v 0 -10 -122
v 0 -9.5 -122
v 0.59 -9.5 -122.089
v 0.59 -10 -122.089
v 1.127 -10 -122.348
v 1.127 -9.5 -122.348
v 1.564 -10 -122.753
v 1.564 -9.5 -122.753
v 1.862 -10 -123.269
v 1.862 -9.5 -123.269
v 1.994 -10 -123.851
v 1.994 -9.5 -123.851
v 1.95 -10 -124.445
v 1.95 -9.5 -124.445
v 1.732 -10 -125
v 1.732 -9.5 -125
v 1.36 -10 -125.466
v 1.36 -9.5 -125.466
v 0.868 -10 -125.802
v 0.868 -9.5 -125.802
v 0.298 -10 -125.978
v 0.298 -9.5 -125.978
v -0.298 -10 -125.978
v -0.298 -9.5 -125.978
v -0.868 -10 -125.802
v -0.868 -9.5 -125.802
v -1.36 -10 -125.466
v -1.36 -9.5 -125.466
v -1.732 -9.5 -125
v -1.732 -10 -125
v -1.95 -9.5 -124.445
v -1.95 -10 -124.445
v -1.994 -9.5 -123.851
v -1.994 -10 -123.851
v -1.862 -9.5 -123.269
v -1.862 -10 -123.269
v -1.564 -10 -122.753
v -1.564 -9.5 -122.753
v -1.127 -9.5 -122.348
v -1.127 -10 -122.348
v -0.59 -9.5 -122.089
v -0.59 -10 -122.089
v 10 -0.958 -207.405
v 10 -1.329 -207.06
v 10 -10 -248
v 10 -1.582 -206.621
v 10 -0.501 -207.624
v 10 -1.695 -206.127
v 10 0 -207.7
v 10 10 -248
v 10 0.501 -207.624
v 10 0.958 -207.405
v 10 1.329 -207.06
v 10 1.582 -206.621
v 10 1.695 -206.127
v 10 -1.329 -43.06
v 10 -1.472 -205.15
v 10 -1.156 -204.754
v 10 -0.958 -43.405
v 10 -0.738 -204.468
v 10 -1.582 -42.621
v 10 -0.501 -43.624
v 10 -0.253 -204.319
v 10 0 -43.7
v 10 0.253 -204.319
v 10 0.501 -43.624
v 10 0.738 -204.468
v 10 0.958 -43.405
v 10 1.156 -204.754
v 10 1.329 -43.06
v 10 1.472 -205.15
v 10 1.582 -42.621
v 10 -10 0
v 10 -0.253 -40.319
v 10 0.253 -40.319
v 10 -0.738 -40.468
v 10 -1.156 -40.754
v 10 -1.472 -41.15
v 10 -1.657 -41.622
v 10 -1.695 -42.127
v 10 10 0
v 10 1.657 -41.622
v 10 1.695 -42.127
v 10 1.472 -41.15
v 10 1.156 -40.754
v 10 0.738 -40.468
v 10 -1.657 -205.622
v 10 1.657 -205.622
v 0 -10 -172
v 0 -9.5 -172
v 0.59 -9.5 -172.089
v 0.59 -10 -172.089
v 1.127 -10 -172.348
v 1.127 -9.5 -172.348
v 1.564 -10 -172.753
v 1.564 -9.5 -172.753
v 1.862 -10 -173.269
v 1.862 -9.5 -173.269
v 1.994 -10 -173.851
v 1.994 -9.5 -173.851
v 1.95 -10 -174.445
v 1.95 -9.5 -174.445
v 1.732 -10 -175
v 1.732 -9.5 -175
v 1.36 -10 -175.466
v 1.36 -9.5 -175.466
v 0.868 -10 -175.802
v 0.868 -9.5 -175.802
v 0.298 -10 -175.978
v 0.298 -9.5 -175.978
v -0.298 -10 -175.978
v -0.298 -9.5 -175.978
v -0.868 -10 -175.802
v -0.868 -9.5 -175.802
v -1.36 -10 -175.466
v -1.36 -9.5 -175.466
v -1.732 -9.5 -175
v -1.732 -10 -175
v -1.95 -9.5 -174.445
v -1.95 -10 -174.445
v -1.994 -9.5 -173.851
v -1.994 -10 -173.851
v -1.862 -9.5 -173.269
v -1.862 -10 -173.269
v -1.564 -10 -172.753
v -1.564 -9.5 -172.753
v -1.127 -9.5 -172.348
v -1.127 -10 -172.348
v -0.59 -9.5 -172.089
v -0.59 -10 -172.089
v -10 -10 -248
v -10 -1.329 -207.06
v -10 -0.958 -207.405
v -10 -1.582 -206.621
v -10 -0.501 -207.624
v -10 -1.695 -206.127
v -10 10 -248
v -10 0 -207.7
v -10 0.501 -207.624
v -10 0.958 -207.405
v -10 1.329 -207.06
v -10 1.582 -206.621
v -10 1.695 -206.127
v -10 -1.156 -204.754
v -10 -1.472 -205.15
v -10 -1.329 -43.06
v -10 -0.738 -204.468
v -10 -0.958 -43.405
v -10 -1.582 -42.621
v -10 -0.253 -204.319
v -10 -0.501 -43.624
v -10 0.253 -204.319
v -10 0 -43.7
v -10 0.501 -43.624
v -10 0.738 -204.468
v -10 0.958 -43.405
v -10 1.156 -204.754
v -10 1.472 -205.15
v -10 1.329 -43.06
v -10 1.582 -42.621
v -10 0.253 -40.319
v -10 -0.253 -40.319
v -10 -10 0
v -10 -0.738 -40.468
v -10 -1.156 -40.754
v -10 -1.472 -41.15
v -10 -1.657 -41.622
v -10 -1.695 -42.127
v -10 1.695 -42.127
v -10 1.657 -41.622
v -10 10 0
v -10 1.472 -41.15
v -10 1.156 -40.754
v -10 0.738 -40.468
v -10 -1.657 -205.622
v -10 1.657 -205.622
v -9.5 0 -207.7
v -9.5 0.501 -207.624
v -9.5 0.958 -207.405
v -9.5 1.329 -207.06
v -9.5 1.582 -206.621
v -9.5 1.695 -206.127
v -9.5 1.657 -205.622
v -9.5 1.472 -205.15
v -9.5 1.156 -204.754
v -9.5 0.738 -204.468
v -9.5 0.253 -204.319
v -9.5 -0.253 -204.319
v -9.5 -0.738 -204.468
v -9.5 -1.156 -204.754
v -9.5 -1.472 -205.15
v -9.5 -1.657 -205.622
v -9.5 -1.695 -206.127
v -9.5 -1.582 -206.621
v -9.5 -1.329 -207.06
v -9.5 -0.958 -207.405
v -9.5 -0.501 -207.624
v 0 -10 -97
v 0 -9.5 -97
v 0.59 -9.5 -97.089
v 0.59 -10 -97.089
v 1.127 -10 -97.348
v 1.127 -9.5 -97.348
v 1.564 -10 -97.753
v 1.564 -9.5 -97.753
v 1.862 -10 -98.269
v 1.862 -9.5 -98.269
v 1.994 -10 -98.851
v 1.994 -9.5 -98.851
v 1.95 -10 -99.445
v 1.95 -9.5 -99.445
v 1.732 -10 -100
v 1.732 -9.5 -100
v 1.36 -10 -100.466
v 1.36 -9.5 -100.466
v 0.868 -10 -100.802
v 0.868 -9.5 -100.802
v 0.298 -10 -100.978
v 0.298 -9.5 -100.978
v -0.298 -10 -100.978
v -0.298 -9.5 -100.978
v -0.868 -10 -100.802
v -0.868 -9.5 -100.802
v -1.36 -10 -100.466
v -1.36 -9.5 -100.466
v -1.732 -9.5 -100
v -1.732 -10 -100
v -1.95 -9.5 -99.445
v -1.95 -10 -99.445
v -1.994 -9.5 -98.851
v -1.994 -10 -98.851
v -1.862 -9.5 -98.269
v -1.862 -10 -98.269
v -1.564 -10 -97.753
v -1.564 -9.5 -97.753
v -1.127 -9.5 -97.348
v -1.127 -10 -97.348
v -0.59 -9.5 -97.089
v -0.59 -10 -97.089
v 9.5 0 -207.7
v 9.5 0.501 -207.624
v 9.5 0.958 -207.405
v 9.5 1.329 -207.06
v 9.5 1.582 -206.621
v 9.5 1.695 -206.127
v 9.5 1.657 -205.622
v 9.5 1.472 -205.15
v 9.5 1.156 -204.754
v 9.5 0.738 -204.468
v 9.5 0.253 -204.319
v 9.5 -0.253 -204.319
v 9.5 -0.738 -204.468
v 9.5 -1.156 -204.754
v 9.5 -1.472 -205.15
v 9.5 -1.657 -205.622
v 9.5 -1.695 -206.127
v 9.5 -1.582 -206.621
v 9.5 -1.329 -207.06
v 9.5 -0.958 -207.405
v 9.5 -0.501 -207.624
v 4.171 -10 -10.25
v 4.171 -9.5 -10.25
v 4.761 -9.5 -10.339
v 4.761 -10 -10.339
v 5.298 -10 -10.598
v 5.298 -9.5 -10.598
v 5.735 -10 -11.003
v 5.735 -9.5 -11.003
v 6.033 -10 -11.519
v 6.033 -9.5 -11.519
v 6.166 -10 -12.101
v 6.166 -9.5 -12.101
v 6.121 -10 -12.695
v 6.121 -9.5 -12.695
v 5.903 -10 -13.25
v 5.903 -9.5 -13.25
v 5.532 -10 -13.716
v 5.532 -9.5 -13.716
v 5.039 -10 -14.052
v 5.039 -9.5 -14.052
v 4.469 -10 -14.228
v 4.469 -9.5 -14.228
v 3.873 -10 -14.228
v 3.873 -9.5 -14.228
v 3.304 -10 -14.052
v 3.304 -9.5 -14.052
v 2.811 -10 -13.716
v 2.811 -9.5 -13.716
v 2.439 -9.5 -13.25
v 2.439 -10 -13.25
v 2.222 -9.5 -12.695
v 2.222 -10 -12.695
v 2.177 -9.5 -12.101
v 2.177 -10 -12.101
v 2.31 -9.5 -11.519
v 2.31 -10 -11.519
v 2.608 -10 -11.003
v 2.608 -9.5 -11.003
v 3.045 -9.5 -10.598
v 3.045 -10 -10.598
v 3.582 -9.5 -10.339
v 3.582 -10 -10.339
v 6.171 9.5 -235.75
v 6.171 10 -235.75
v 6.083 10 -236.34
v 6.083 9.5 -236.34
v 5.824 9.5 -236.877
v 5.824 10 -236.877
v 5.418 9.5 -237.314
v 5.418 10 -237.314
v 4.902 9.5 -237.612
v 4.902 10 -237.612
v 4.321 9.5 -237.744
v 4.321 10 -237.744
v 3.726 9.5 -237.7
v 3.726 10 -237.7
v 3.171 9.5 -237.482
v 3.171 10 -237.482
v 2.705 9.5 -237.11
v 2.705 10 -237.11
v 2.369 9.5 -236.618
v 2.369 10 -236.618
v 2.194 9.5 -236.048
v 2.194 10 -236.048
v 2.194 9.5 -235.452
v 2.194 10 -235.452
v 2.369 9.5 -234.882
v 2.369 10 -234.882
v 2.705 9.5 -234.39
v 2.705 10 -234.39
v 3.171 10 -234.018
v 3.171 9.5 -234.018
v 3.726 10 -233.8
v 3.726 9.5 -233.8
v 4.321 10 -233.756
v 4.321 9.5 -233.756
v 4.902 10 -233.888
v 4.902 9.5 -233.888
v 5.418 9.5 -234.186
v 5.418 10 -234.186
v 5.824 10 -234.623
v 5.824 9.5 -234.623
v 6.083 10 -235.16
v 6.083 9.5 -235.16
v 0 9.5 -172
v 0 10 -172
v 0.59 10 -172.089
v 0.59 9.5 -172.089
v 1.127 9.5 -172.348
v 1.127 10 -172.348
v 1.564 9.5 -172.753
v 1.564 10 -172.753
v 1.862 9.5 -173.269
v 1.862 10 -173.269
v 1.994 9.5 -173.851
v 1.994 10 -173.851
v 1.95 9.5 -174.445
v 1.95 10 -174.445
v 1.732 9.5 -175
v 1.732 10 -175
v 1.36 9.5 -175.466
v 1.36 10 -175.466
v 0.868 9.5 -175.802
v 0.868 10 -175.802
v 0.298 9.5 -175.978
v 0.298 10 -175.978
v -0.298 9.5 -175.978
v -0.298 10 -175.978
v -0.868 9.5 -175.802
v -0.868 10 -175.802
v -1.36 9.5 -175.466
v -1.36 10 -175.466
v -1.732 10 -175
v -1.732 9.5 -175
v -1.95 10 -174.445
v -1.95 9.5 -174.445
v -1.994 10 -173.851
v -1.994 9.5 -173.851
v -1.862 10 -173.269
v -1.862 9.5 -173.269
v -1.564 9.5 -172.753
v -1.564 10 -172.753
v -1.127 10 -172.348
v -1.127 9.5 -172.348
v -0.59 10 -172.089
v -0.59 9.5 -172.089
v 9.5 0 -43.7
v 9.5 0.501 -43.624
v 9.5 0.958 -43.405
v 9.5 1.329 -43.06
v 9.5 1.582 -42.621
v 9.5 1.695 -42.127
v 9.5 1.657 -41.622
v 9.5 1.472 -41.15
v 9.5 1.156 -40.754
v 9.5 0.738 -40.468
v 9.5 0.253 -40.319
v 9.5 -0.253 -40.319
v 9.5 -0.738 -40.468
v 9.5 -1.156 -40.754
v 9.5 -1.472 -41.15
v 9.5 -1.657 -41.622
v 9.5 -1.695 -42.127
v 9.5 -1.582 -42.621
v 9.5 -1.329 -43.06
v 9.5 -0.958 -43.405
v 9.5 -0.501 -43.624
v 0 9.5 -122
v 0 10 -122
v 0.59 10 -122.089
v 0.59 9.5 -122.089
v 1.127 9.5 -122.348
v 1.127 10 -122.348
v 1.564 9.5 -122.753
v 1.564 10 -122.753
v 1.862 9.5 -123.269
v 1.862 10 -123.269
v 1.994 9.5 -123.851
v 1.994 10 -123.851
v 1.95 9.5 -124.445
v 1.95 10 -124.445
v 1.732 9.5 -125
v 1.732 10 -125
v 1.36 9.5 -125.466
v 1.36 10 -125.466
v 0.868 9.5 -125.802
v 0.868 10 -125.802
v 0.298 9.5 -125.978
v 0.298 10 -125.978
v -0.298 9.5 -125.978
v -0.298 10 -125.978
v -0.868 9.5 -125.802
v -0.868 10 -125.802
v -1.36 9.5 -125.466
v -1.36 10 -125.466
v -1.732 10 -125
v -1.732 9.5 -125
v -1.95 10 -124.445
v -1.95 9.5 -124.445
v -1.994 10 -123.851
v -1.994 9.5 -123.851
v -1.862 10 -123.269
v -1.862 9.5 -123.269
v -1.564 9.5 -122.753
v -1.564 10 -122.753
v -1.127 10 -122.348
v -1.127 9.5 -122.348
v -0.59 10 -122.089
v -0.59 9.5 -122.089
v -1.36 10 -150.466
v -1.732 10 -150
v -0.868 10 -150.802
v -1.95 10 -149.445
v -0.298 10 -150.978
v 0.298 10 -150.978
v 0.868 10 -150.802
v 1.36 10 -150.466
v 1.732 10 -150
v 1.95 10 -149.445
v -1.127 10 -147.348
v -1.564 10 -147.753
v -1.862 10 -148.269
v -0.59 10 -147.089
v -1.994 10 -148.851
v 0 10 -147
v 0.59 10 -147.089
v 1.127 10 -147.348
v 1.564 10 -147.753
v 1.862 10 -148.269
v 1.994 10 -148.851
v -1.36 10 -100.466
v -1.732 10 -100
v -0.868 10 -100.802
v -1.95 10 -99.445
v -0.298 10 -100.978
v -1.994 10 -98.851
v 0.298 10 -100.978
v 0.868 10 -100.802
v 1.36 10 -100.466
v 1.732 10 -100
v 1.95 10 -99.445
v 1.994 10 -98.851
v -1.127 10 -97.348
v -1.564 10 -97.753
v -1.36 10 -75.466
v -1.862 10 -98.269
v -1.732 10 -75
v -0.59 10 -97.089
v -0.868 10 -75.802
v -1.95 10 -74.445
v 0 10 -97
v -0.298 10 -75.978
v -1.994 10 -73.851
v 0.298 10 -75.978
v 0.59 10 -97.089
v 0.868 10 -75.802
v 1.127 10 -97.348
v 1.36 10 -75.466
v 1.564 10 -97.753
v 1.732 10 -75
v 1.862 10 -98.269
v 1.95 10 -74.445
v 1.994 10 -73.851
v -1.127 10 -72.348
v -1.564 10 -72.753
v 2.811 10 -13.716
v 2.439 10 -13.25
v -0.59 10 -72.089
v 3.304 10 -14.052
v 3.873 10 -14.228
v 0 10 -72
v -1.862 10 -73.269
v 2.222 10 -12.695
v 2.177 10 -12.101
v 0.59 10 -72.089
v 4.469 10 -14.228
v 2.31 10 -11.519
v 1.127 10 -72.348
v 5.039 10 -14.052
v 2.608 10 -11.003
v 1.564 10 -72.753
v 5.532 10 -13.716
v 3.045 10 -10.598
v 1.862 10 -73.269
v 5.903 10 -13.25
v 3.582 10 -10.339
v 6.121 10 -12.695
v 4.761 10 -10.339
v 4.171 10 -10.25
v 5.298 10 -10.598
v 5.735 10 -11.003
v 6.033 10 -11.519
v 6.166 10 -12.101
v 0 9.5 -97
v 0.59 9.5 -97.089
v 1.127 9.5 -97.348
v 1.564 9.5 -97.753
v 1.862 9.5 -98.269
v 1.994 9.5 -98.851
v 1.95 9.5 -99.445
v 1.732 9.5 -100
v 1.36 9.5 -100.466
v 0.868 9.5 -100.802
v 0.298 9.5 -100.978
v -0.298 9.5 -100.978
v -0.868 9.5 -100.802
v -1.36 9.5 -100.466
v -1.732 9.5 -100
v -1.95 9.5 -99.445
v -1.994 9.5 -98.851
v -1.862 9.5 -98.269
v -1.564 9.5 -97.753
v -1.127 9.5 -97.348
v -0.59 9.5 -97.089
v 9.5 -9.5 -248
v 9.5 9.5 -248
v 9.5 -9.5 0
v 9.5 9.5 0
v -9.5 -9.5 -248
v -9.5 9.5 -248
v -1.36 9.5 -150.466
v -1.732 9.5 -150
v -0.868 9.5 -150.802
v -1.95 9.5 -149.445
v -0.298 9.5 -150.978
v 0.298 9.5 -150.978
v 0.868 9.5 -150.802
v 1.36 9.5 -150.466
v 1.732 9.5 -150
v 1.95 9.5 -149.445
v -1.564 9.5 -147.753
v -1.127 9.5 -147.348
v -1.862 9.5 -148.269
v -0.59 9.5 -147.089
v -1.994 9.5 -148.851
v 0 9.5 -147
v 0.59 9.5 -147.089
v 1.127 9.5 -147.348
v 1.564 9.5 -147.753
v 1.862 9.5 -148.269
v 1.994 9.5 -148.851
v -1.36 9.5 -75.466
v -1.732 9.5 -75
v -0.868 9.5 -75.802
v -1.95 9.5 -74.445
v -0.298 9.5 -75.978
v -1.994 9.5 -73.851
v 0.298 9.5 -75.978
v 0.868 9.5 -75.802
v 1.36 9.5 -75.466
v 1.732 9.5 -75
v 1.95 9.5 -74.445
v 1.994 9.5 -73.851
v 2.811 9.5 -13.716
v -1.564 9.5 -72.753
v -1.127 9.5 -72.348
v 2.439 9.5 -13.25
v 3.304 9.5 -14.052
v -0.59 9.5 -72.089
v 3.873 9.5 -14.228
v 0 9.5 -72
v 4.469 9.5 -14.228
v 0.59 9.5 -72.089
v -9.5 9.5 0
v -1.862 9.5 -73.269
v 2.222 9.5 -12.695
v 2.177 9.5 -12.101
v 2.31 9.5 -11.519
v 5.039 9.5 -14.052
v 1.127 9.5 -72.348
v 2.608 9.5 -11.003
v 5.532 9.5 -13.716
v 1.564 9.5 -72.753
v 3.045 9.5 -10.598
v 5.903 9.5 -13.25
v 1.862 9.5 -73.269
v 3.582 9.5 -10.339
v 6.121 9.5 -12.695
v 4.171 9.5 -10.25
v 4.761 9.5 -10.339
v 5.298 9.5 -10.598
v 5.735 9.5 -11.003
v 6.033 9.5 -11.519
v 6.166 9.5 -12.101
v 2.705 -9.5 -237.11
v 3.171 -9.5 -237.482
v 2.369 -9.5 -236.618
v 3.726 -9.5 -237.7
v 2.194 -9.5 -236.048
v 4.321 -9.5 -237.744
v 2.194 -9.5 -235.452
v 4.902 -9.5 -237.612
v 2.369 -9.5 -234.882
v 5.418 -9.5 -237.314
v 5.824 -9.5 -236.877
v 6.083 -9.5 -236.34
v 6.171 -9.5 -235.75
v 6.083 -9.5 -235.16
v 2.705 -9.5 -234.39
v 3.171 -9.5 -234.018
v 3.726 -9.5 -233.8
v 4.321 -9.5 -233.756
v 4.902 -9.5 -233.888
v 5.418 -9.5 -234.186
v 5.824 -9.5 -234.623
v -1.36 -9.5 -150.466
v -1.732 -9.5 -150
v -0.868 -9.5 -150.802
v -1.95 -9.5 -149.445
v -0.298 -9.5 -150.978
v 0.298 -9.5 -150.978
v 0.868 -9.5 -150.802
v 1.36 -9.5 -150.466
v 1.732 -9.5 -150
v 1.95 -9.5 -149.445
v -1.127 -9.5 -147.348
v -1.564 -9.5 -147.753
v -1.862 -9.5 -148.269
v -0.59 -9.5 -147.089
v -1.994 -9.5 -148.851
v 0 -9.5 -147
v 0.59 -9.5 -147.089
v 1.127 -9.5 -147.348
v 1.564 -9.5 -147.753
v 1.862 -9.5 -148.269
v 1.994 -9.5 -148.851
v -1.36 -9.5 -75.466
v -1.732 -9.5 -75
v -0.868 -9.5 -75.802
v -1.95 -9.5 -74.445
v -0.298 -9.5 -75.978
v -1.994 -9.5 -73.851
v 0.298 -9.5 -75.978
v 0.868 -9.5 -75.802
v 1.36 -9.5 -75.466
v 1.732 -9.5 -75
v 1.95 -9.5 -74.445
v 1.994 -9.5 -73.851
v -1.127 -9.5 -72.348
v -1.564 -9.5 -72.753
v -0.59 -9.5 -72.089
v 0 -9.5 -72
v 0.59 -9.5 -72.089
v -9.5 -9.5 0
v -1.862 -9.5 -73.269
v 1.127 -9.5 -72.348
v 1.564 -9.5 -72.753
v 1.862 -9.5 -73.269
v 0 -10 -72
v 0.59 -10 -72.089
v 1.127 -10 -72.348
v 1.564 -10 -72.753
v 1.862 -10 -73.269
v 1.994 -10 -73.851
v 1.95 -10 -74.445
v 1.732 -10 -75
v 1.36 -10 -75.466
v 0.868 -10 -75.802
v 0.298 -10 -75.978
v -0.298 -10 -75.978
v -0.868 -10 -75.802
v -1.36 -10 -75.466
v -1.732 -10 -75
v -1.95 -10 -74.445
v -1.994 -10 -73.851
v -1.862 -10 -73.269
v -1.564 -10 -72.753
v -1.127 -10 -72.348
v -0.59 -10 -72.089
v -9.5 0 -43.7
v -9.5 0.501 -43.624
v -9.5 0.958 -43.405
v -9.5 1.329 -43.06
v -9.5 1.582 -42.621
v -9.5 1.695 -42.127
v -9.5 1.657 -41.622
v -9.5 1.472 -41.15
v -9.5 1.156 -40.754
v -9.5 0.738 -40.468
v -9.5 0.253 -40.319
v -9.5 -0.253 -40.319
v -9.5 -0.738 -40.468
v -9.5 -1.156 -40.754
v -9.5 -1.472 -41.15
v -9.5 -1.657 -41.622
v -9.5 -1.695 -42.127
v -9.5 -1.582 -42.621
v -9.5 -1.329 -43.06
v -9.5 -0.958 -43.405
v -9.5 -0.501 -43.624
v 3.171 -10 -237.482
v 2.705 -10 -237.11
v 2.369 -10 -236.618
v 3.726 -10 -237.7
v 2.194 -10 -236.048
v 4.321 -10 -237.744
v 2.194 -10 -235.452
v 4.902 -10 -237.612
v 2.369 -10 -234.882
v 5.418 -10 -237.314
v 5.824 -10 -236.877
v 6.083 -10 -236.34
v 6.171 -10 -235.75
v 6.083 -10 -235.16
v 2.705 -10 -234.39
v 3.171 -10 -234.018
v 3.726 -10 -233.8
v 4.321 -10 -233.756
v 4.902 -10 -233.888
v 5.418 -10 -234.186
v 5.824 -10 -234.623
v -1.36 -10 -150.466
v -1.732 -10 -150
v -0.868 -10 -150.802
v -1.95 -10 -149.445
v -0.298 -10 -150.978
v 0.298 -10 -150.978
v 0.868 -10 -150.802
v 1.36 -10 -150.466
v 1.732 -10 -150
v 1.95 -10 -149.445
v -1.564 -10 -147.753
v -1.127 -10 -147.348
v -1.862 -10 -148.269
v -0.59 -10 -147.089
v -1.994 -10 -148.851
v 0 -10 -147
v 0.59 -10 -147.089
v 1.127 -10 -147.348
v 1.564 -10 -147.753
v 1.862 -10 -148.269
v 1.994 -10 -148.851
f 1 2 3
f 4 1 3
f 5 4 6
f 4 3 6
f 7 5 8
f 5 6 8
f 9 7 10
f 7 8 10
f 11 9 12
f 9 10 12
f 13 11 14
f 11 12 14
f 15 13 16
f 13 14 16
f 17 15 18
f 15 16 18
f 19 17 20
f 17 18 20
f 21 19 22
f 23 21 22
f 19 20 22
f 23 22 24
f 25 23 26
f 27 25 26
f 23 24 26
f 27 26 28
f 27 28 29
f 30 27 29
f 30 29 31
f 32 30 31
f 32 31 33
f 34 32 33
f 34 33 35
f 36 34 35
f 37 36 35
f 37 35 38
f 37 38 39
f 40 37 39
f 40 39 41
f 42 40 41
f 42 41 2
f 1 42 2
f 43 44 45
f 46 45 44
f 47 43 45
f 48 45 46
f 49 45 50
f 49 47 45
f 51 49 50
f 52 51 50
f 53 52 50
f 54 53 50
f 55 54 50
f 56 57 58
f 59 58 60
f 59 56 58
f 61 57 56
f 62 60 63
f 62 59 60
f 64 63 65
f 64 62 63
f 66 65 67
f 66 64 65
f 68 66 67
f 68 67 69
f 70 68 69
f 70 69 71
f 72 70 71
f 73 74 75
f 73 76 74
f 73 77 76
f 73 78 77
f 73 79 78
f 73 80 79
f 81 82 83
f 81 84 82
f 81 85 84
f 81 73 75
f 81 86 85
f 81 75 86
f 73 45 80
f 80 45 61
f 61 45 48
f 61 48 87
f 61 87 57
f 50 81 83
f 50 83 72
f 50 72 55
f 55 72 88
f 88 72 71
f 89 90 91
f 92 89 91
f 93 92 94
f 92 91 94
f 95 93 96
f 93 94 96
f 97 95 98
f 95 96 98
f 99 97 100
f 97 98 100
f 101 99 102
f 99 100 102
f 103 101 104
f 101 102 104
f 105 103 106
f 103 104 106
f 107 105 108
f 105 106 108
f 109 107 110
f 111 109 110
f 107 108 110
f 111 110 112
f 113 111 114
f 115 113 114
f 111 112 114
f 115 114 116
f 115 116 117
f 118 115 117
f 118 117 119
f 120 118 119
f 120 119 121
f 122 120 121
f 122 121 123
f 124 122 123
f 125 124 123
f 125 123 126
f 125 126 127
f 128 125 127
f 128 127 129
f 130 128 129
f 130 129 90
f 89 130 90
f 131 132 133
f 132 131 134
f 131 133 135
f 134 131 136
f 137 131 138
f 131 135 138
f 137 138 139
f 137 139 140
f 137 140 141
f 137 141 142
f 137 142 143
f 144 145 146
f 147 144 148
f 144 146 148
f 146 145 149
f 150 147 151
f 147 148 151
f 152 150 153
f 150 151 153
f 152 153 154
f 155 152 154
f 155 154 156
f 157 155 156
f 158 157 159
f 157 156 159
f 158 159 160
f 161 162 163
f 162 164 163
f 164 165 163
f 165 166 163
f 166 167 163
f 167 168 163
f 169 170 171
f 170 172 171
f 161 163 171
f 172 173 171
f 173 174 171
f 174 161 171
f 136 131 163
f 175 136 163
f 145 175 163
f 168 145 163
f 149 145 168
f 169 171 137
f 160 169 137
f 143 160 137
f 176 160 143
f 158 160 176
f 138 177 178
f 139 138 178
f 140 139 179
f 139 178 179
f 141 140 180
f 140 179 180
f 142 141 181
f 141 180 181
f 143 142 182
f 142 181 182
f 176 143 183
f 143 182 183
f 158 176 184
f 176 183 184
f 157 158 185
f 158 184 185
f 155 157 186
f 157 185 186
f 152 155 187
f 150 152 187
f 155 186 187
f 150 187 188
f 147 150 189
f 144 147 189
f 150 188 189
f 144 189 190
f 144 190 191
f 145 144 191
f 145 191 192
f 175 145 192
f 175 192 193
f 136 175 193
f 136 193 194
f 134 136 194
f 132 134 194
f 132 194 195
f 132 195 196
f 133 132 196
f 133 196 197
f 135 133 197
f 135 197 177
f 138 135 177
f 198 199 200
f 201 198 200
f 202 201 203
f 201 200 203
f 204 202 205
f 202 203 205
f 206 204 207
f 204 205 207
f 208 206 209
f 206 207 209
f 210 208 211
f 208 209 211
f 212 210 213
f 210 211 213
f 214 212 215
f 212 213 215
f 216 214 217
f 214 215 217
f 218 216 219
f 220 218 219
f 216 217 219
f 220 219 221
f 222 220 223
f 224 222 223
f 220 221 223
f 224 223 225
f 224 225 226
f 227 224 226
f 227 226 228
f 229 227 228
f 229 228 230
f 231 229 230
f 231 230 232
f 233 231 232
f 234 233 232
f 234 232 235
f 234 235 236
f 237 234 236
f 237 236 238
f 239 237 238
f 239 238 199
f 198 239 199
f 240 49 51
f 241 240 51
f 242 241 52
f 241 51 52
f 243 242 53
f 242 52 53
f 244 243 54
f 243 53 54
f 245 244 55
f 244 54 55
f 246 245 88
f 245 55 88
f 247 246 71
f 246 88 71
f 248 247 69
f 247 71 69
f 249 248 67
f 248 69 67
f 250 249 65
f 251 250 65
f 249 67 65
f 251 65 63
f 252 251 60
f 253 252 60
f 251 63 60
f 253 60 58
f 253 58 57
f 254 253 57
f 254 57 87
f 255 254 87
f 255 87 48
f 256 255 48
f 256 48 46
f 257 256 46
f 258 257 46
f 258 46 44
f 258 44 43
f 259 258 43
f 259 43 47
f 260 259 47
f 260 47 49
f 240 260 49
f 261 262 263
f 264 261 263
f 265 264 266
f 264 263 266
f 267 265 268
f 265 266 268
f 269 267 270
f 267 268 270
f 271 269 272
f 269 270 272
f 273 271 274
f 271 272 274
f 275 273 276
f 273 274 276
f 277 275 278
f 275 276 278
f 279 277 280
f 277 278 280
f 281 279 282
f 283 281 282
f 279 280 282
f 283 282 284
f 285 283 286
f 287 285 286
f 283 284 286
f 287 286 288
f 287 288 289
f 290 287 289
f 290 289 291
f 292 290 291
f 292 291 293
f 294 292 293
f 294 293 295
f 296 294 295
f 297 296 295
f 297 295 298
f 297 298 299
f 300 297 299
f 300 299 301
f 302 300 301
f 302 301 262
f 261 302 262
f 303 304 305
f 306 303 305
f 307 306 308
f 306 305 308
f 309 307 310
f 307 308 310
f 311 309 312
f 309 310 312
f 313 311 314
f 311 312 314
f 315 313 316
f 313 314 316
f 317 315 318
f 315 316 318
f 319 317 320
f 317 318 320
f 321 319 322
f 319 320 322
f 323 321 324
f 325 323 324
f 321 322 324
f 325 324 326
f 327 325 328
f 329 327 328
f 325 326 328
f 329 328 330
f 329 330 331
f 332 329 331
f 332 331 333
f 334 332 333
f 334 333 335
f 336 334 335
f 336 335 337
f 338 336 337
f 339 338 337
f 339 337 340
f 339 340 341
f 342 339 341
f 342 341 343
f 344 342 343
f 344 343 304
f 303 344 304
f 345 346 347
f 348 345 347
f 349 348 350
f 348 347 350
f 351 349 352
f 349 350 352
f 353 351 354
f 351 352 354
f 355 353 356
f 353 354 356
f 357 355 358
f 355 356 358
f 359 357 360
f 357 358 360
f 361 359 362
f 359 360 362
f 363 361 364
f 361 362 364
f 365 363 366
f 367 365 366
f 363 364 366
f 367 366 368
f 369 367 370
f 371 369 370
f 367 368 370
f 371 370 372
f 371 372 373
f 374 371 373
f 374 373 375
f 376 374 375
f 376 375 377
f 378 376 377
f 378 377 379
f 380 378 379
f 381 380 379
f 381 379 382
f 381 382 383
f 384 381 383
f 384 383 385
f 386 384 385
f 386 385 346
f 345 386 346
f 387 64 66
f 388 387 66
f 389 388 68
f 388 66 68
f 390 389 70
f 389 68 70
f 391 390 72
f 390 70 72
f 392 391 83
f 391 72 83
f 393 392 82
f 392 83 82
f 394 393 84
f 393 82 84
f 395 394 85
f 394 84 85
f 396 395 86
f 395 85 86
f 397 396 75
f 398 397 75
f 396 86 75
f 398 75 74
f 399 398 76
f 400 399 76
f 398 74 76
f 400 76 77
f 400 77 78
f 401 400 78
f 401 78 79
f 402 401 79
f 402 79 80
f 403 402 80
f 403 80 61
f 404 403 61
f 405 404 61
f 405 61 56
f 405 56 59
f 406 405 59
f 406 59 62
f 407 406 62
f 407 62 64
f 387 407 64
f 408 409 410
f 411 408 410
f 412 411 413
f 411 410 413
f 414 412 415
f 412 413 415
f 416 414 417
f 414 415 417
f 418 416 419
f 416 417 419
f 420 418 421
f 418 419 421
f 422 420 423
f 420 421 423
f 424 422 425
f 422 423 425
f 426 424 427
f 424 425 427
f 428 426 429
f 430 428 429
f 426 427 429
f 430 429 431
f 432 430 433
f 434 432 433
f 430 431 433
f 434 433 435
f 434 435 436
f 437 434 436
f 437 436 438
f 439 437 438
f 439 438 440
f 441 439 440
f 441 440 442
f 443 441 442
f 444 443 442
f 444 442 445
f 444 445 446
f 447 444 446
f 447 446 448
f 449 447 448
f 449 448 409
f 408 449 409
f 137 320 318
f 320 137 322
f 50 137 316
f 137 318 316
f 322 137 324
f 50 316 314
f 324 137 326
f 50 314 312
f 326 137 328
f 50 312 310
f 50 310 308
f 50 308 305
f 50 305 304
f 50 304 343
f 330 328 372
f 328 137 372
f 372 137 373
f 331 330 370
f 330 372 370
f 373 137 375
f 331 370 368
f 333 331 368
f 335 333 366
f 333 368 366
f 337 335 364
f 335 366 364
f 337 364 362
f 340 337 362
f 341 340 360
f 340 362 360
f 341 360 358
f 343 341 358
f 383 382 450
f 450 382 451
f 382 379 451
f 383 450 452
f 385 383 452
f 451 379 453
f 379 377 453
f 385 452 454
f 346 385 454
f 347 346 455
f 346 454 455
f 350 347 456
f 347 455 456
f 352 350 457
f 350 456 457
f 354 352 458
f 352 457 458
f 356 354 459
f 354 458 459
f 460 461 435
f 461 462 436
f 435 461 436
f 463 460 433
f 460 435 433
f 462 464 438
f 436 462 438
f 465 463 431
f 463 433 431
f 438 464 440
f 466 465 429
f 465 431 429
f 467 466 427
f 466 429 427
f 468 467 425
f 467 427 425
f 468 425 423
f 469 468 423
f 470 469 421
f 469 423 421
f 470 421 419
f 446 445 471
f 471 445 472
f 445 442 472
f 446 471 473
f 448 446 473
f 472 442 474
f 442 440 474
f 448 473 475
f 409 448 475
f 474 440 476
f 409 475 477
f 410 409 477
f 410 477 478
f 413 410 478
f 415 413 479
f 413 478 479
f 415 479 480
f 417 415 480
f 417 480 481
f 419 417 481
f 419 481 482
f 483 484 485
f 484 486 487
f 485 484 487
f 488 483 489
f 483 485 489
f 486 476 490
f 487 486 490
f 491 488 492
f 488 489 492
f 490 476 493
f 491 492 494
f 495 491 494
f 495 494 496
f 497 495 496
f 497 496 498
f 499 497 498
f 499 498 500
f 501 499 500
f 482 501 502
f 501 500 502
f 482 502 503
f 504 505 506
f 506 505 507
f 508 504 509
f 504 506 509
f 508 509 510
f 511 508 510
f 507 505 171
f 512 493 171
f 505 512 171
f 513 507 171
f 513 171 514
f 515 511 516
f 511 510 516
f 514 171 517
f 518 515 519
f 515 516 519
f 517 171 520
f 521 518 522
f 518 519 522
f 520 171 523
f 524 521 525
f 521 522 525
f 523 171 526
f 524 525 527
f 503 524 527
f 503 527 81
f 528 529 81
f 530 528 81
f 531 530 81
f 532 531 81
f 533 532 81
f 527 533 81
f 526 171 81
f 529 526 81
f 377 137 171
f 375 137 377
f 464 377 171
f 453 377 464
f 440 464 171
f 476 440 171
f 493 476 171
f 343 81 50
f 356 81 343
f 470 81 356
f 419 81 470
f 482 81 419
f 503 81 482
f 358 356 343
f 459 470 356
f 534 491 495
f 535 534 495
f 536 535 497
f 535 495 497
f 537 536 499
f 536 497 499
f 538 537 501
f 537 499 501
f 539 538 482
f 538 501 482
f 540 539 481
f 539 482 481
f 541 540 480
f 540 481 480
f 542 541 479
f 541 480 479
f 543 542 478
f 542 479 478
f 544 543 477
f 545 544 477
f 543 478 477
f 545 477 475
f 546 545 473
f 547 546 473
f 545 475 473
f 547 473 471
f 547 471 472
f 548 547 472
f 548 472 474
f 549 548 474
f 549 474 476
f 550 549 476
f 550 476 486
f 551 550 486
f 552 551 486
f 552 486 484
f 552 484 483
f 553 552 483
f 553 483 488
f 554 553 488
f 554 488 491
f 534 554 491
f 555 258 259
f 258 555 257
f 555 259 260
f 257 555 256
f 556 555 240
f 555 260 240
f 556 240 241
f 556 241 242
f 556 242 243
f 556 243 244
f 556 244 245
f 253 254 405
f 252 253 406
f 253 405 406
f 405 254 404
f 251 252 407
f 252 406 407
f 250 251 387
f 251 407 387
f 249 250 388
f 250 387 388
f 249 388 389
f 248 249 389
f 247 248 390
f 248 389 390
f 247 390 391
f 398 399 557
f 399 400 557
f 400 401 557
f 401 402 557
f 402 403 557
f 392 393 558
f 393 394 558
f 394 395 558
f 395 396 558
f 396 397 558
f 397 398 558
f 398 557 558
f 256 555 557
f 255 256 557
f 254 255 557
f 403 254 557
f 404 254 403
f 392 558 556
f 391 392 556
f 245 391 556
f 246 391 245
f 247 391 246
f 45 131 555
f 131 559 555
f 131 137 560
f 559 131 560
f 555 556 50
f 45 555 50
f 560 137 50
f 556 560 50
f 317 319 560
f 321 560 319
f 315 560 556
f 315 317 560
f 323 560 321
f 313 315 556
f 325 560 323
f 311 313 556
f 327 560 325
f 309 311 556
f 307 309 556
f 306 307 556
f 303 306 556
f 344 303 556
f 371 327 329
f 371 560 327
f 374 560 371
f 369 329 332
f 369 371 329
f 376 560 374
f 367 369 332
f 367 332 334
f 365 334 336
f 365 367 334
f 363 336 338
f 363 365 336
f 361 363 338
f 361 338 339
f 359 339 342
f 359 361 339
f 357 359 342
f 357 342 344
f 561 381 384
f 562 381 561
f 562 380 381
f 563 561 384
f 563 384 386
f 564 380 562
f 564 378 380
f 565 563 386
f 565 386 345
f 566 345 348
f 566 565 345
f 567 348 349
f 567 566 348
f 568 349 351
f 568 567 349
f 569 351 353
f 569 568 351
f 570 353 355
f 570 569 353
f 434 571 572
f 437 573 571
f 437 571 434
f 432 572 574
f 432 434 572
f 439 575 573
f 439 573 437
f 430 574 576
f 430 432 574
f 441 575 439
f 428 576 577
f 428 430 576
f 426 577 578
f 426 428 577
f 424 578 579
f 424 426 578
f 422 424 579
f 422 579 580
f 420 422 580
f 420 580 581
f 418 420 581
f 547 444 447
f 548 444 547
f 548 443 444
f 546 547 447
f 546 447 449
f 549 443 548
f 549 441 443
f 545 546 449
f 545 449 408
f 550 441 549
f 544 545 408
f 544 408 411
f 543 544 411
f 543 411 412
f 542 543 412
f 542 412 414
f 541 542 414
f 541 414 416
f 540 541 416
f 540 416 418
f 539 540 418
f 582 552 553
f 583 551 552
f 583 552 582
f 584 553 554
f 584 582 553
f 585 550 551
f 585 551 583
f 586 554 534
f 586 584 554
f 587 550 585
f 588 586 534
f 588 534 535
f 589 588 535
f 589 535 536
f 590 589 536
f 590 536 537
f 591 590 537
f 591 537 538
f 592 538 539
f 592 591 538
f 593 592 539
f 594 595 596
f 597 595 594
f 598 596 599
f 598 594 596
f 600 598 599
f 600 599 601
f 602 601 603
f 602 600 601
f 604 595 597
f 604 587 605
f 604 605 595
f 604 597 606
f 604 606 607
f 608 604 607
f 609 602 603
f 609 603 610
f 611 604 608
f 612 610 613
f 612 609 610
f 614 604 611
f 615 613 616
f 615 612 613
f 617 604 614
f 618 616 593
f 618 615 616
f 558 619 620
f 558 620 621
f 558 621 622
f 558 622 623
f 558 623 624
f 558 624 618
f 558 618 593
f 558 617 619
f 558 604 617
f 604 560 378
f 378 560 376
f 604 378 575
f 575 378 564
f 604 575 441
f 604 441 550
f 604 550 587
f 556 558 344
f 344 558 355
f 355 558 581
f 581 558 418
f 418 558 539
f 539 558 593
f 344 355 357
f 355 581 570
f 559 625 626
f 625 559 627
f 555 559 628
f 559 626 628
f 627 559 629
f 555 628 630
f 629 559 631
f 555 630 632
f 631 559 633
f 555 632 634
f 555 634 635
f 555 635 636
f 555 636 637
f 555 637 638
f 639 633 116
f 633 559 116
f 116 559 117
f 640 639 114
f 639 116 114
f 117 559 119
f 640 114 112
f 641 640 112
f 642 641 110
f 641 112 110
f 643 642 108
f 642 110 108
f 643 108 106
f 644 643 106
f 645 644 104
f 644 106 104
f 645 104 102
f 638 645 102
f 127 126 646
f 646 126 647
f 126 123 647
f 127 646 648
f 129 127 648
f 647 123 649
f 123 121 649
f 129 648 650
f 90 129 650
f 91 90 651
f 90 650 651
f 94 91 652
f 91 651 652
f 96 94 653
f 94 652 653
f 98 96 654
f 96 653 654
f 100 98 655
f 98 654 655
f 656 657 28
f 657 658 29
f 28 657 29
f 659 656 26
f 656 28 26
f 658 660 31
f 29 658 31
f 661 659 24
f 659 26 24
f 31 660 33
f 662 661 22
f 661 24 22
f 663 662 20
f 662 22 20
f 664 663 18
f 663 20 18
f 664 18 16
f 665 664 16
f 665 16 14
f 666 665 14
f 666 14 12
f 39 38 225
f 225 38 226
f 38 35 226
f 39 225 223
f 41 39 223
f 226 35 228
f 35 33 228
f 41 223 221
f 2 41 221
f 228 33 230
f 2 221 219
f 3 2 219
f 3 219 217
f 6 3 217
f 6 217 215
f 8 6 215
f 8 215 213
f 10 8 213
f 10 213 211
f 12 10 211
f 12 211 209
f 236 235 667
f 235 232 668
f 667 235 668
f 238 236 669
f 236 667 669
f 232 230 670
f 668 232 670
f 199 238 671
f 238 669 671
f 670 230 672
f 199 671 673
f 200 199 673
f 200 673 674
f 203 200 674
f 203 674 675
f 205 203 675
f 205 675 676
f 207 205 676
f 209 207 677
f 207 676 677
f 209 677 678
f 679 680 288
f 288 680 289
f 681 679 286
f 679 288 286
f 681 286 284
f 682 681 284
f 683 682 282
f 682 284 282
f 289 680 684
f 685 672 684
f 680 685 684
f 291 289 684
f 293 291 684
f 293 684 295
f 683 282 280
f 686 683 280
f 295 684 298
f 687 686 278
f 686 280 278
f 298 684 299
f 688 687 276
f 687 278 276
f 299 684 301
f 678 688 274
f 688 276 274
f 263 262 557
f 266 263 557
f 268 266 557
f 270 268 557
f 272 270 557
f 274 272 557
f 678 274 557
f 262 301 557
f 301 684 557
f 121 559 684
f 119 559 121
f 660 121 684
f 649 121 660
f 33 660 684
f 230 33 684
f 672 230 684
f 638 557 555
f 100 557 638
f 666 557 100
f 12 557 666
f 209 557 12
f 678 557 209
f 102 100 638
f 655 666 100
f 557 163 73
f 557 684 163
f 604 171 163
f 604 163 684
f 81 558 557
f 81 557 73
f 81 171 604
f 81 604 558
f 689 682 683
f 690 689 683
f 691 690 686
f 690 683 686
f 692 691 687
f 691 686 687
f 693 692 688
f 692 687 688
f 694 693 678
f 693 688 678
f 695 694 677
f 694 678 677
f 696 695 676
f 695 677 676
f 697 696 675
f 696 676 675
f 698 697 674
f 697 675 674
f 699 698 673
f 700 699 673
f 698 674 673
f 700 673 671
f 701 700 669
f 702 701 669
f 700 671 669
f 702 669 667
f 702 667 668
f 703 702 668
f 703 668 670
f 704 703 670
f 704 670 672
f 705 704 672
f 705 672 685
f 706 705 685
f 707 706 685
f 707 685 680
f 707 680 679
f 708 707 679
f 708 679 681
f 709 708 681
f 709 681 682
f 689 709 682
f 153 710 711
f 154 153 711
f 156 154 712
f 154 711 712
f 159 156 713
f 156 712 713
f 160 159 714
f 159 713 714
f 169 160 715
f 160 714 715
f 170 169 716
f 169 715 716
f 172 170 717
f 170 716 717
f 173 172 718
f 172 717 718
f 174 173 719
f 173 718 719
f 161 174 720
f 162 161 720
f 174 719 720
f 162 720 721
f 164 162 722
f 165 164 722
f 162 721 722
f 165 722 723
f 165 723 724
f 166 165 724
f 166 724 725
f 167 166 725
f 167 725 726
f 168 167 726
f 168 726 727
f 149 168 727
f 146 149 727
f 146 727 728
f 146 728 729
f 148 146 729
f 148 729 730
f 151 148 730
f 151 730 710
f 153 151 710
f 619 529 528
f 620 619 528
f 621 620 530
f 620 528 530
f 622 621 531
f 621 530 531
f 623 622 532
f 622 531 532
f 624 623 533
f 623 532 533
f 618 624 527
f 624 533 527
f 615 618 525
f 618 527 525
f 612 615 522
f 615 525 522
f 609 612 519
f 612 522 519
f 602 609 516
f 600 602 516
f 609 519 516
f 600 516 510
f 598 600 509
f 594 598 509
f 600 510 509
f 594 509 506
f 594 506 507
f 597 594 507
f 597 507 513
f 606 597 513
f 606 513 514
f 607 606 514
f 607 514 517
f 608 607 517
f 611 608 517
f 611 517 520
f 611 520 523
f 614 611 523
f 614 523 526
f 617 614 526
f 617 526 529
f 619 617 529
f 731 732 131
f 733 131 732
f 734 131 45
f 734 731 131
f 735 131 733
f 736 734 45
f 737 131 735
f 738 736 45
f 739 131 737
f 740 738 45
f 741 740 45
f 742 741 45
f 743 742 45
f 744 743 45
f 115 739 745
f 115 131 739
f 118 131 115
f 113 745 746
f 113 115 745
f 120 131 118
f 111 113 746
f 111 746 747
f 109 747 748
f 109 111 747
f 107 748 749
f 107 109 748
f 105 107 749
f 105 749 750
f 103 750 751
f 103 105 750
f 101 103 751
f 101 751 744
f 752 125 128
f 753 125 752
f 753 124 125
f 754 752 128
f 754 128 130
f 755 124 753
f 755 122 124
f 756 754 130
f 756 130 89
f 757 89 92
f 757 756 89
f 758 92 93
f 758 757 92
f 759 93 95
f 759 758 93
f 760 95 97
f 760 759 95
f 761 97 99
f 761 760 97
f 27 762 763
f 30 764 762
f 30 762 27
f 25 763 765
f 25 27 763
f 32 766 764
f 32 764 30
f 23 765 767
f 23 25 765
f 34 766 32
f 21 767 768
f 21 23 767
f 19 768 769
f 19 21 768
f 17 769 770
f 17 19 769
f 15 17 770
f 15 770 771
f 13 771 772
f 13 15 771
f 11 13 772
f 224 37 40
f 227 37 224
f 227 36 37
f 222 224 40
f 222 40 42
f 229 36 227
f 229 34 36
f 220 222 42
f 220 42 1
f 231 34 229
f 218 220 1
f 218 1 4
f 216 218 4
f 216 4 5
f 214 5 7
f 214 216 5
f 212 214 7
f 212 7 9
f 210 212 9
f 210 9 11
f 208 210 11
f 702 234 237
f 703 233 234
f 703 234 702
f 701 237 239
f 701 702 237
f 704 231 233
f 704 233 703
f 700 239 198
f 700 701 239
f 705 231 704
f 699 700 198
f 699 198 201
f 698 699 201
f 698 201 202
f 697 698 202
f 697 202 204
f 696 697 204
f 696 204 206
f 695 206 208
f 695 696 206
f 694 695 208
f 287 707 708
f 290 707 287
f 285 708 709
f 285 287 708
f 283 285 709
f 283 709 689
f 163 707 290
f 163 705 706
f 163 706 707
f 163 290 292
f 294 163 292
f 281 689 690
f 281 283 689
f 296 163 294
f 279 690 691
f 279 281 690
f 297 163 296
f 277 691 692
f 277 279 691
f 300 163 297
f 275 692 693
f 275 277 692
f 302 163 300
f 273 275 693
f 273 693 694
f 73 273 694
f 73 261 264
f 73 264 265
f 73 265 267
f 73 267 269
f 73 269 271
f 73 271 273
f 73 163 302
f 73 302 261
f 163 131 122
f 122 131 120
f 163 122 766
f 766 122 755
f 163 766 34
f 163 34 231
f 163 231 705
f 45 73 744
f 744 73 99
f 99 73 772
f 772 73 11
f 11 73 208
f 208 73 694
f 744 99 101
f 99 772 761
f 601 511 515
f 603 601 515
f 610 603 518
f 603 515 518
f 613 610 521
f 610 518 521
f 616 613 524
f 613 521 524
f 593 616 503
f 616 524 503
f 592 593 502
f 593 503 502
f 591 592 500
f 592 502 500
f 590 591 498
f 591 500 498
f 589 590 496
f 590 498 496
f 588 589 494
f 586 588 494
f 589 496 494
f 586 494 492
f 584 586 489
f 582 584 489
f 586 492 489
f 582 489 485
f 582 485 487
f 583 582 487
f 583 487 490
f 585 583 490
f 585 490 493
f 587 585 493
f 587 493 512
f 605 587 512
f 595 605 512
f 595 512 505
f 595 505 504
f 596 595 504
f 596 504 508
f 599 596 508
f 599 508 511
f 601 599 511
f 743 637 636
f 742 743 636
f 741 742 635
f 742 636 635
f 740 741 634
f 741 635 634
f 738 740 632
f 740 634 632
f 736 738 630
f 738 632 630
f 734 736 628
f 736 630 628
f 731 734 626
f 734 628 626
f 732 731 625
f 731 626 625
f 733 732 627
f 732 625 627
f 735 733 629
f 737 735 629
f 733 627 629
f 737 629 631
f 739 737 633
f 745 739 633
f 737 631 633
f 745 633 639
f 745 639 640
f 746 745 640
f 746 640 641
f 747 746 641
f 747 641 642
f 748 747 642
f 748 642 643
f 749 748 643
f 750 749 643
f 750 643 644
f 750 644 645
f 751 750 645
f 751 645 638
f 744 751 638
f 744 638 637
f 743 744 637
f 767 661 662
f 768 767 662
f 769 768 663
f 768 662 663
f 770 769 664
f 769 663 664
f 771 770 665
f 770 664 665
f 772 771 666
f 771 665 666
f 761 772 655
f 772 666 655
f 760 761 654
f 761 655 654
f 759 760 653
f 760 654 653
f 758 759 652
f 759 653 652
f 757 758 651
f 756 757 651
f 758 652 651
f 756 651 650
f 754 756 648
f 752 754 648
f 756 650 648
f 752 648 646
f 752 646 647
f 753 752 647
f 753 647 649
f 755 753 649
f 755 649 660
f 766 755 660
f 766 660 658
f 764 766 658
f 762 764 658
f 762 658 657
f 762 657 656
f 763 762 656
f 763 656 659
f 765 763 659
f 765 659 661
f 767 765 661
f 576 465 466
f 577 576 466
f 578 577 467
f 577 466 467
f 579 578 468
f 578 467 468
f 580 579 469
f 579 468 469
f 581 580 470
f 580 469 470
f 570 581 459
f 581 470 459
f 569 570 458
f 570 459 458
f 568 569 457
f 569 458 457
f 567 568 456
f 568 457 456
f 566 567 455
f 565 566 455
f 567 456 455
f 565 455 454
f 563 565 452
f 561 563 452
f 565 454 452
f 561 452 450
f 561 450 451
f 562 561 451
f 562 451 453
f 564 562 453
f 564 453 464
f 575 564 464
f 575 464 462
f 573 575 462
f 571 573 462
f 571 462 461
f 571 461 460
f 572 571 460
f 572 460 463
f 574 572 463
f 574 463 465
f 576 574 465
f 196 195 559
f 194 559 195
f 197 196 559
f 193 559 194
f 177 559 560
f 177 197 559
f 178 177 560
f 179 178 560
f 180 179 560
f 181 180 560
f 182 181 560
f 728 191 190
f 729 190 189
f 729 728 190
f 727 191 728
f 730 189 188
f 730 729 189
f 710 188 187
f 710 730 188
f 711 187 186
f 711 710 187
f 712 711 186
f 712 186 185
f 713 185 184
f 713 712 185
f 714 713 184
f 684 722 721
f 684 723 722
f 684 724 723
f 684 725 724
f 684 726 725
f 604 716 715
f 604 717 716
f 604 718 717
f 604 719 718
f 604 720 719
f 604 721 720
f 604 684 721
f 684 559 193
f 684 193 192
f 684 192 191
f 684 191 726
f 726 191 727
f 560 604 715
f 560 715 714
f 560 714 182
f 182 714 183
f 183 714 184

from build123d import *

# Parameters (mm, degrees)
SKETCH_1_W          = 20
SKETCH_1_H          = 20
SKETCH_1_W_2        = 19
SKETCH_1_H_2        = 19
EXTRUDE_1_DEPTH     = 248
SKETCH_2_R          = 2
CUT_EXTRUDE_1_DEPTH = 250.006024024
SKETCH_3_R          = 2
CUT_EXTRUDE_2_DEPTH = 250.006024024
SKETCH_4_R          = 1.7
CUT_EXTRUDE_3_DEPTH = 250.006024024


with BuildPart() as part:
    # 草图1 → 凸台-拉伸1 (new body)
    with BuildSketch(Plane.XY):
        Rectangle(SKETCH_1_W, SKETCH_1_H)
        Rectangle(SKETCH_1_W_2, SKETCH_1_H_2, mode=Mode.SUBTRACT)
    extrude(amount=-EXTRUDE_1_DEPTH)

    # 草图2 → 切除-拉伸1 (cut, through all)
    with BuildSketch(Plane(origin=(0, 10, 0), x_dir=(1, 0, 0), z_dir=(0, 1, 0))):
        with Locations(Location((4.171407716, 12.25, 0), (0, 0, 270))):
            Circle(SKETCH_2_R)
        with Locations((4.171407716, 235.75)):
            Circle(SKETCH_2_R)
    extrude(amount=-CUT_EXTRUDE_1_DEPTH, mode=Mode.SUBTRACT)

    # 草图3 → 切除-拉伸2 (cut, through all)
    with BuildSketch(Plane(origin=(0, 10, 0), x_dir=(1, 0, 0), z_dir=(0, 1, 0))):
        with Locations(Location((0, 74, 0), (0, 0, 270))):
            Circle(SKETCH_3_R)
        with Locations(Location((0, 99, 0), (0, 0, 270))):
            Circle(SKETCH_3_R)
        with Locations(Location((0, 124, 0), (0, 0, 270))):
            Circle(SKETCH_3_R)
        with Locations(Location((0, 149, 0), (0, 0, 270))):
            Circle(SKETCH_3_R)
        with Locations(Location((0, 174, 0), (0, 0, 270))):
            Circle(SKETCH_3_R)
    extrude(amount=-CUT_EXTRUDE_2_DEPTH, mode=Mode.SUBTRACT)

    # 草图4 → 切除-拉伸3 (cut, through all)
    with BuildSketch(Plane(origin=(10, 0, 0), x_dir=(0, 0, -1), z_dir=(1, 0, 0))):
        with Locations((42, 0)):
            Circle(SKETCH_4_R)
        with Locations((206, 0)):
            Circle(SKETCH_4_R)
    extrude(amount=-CUT_EXTRUDE_3_DEPTH, mode=Mode.SUBTRACT)


solid = part.part
